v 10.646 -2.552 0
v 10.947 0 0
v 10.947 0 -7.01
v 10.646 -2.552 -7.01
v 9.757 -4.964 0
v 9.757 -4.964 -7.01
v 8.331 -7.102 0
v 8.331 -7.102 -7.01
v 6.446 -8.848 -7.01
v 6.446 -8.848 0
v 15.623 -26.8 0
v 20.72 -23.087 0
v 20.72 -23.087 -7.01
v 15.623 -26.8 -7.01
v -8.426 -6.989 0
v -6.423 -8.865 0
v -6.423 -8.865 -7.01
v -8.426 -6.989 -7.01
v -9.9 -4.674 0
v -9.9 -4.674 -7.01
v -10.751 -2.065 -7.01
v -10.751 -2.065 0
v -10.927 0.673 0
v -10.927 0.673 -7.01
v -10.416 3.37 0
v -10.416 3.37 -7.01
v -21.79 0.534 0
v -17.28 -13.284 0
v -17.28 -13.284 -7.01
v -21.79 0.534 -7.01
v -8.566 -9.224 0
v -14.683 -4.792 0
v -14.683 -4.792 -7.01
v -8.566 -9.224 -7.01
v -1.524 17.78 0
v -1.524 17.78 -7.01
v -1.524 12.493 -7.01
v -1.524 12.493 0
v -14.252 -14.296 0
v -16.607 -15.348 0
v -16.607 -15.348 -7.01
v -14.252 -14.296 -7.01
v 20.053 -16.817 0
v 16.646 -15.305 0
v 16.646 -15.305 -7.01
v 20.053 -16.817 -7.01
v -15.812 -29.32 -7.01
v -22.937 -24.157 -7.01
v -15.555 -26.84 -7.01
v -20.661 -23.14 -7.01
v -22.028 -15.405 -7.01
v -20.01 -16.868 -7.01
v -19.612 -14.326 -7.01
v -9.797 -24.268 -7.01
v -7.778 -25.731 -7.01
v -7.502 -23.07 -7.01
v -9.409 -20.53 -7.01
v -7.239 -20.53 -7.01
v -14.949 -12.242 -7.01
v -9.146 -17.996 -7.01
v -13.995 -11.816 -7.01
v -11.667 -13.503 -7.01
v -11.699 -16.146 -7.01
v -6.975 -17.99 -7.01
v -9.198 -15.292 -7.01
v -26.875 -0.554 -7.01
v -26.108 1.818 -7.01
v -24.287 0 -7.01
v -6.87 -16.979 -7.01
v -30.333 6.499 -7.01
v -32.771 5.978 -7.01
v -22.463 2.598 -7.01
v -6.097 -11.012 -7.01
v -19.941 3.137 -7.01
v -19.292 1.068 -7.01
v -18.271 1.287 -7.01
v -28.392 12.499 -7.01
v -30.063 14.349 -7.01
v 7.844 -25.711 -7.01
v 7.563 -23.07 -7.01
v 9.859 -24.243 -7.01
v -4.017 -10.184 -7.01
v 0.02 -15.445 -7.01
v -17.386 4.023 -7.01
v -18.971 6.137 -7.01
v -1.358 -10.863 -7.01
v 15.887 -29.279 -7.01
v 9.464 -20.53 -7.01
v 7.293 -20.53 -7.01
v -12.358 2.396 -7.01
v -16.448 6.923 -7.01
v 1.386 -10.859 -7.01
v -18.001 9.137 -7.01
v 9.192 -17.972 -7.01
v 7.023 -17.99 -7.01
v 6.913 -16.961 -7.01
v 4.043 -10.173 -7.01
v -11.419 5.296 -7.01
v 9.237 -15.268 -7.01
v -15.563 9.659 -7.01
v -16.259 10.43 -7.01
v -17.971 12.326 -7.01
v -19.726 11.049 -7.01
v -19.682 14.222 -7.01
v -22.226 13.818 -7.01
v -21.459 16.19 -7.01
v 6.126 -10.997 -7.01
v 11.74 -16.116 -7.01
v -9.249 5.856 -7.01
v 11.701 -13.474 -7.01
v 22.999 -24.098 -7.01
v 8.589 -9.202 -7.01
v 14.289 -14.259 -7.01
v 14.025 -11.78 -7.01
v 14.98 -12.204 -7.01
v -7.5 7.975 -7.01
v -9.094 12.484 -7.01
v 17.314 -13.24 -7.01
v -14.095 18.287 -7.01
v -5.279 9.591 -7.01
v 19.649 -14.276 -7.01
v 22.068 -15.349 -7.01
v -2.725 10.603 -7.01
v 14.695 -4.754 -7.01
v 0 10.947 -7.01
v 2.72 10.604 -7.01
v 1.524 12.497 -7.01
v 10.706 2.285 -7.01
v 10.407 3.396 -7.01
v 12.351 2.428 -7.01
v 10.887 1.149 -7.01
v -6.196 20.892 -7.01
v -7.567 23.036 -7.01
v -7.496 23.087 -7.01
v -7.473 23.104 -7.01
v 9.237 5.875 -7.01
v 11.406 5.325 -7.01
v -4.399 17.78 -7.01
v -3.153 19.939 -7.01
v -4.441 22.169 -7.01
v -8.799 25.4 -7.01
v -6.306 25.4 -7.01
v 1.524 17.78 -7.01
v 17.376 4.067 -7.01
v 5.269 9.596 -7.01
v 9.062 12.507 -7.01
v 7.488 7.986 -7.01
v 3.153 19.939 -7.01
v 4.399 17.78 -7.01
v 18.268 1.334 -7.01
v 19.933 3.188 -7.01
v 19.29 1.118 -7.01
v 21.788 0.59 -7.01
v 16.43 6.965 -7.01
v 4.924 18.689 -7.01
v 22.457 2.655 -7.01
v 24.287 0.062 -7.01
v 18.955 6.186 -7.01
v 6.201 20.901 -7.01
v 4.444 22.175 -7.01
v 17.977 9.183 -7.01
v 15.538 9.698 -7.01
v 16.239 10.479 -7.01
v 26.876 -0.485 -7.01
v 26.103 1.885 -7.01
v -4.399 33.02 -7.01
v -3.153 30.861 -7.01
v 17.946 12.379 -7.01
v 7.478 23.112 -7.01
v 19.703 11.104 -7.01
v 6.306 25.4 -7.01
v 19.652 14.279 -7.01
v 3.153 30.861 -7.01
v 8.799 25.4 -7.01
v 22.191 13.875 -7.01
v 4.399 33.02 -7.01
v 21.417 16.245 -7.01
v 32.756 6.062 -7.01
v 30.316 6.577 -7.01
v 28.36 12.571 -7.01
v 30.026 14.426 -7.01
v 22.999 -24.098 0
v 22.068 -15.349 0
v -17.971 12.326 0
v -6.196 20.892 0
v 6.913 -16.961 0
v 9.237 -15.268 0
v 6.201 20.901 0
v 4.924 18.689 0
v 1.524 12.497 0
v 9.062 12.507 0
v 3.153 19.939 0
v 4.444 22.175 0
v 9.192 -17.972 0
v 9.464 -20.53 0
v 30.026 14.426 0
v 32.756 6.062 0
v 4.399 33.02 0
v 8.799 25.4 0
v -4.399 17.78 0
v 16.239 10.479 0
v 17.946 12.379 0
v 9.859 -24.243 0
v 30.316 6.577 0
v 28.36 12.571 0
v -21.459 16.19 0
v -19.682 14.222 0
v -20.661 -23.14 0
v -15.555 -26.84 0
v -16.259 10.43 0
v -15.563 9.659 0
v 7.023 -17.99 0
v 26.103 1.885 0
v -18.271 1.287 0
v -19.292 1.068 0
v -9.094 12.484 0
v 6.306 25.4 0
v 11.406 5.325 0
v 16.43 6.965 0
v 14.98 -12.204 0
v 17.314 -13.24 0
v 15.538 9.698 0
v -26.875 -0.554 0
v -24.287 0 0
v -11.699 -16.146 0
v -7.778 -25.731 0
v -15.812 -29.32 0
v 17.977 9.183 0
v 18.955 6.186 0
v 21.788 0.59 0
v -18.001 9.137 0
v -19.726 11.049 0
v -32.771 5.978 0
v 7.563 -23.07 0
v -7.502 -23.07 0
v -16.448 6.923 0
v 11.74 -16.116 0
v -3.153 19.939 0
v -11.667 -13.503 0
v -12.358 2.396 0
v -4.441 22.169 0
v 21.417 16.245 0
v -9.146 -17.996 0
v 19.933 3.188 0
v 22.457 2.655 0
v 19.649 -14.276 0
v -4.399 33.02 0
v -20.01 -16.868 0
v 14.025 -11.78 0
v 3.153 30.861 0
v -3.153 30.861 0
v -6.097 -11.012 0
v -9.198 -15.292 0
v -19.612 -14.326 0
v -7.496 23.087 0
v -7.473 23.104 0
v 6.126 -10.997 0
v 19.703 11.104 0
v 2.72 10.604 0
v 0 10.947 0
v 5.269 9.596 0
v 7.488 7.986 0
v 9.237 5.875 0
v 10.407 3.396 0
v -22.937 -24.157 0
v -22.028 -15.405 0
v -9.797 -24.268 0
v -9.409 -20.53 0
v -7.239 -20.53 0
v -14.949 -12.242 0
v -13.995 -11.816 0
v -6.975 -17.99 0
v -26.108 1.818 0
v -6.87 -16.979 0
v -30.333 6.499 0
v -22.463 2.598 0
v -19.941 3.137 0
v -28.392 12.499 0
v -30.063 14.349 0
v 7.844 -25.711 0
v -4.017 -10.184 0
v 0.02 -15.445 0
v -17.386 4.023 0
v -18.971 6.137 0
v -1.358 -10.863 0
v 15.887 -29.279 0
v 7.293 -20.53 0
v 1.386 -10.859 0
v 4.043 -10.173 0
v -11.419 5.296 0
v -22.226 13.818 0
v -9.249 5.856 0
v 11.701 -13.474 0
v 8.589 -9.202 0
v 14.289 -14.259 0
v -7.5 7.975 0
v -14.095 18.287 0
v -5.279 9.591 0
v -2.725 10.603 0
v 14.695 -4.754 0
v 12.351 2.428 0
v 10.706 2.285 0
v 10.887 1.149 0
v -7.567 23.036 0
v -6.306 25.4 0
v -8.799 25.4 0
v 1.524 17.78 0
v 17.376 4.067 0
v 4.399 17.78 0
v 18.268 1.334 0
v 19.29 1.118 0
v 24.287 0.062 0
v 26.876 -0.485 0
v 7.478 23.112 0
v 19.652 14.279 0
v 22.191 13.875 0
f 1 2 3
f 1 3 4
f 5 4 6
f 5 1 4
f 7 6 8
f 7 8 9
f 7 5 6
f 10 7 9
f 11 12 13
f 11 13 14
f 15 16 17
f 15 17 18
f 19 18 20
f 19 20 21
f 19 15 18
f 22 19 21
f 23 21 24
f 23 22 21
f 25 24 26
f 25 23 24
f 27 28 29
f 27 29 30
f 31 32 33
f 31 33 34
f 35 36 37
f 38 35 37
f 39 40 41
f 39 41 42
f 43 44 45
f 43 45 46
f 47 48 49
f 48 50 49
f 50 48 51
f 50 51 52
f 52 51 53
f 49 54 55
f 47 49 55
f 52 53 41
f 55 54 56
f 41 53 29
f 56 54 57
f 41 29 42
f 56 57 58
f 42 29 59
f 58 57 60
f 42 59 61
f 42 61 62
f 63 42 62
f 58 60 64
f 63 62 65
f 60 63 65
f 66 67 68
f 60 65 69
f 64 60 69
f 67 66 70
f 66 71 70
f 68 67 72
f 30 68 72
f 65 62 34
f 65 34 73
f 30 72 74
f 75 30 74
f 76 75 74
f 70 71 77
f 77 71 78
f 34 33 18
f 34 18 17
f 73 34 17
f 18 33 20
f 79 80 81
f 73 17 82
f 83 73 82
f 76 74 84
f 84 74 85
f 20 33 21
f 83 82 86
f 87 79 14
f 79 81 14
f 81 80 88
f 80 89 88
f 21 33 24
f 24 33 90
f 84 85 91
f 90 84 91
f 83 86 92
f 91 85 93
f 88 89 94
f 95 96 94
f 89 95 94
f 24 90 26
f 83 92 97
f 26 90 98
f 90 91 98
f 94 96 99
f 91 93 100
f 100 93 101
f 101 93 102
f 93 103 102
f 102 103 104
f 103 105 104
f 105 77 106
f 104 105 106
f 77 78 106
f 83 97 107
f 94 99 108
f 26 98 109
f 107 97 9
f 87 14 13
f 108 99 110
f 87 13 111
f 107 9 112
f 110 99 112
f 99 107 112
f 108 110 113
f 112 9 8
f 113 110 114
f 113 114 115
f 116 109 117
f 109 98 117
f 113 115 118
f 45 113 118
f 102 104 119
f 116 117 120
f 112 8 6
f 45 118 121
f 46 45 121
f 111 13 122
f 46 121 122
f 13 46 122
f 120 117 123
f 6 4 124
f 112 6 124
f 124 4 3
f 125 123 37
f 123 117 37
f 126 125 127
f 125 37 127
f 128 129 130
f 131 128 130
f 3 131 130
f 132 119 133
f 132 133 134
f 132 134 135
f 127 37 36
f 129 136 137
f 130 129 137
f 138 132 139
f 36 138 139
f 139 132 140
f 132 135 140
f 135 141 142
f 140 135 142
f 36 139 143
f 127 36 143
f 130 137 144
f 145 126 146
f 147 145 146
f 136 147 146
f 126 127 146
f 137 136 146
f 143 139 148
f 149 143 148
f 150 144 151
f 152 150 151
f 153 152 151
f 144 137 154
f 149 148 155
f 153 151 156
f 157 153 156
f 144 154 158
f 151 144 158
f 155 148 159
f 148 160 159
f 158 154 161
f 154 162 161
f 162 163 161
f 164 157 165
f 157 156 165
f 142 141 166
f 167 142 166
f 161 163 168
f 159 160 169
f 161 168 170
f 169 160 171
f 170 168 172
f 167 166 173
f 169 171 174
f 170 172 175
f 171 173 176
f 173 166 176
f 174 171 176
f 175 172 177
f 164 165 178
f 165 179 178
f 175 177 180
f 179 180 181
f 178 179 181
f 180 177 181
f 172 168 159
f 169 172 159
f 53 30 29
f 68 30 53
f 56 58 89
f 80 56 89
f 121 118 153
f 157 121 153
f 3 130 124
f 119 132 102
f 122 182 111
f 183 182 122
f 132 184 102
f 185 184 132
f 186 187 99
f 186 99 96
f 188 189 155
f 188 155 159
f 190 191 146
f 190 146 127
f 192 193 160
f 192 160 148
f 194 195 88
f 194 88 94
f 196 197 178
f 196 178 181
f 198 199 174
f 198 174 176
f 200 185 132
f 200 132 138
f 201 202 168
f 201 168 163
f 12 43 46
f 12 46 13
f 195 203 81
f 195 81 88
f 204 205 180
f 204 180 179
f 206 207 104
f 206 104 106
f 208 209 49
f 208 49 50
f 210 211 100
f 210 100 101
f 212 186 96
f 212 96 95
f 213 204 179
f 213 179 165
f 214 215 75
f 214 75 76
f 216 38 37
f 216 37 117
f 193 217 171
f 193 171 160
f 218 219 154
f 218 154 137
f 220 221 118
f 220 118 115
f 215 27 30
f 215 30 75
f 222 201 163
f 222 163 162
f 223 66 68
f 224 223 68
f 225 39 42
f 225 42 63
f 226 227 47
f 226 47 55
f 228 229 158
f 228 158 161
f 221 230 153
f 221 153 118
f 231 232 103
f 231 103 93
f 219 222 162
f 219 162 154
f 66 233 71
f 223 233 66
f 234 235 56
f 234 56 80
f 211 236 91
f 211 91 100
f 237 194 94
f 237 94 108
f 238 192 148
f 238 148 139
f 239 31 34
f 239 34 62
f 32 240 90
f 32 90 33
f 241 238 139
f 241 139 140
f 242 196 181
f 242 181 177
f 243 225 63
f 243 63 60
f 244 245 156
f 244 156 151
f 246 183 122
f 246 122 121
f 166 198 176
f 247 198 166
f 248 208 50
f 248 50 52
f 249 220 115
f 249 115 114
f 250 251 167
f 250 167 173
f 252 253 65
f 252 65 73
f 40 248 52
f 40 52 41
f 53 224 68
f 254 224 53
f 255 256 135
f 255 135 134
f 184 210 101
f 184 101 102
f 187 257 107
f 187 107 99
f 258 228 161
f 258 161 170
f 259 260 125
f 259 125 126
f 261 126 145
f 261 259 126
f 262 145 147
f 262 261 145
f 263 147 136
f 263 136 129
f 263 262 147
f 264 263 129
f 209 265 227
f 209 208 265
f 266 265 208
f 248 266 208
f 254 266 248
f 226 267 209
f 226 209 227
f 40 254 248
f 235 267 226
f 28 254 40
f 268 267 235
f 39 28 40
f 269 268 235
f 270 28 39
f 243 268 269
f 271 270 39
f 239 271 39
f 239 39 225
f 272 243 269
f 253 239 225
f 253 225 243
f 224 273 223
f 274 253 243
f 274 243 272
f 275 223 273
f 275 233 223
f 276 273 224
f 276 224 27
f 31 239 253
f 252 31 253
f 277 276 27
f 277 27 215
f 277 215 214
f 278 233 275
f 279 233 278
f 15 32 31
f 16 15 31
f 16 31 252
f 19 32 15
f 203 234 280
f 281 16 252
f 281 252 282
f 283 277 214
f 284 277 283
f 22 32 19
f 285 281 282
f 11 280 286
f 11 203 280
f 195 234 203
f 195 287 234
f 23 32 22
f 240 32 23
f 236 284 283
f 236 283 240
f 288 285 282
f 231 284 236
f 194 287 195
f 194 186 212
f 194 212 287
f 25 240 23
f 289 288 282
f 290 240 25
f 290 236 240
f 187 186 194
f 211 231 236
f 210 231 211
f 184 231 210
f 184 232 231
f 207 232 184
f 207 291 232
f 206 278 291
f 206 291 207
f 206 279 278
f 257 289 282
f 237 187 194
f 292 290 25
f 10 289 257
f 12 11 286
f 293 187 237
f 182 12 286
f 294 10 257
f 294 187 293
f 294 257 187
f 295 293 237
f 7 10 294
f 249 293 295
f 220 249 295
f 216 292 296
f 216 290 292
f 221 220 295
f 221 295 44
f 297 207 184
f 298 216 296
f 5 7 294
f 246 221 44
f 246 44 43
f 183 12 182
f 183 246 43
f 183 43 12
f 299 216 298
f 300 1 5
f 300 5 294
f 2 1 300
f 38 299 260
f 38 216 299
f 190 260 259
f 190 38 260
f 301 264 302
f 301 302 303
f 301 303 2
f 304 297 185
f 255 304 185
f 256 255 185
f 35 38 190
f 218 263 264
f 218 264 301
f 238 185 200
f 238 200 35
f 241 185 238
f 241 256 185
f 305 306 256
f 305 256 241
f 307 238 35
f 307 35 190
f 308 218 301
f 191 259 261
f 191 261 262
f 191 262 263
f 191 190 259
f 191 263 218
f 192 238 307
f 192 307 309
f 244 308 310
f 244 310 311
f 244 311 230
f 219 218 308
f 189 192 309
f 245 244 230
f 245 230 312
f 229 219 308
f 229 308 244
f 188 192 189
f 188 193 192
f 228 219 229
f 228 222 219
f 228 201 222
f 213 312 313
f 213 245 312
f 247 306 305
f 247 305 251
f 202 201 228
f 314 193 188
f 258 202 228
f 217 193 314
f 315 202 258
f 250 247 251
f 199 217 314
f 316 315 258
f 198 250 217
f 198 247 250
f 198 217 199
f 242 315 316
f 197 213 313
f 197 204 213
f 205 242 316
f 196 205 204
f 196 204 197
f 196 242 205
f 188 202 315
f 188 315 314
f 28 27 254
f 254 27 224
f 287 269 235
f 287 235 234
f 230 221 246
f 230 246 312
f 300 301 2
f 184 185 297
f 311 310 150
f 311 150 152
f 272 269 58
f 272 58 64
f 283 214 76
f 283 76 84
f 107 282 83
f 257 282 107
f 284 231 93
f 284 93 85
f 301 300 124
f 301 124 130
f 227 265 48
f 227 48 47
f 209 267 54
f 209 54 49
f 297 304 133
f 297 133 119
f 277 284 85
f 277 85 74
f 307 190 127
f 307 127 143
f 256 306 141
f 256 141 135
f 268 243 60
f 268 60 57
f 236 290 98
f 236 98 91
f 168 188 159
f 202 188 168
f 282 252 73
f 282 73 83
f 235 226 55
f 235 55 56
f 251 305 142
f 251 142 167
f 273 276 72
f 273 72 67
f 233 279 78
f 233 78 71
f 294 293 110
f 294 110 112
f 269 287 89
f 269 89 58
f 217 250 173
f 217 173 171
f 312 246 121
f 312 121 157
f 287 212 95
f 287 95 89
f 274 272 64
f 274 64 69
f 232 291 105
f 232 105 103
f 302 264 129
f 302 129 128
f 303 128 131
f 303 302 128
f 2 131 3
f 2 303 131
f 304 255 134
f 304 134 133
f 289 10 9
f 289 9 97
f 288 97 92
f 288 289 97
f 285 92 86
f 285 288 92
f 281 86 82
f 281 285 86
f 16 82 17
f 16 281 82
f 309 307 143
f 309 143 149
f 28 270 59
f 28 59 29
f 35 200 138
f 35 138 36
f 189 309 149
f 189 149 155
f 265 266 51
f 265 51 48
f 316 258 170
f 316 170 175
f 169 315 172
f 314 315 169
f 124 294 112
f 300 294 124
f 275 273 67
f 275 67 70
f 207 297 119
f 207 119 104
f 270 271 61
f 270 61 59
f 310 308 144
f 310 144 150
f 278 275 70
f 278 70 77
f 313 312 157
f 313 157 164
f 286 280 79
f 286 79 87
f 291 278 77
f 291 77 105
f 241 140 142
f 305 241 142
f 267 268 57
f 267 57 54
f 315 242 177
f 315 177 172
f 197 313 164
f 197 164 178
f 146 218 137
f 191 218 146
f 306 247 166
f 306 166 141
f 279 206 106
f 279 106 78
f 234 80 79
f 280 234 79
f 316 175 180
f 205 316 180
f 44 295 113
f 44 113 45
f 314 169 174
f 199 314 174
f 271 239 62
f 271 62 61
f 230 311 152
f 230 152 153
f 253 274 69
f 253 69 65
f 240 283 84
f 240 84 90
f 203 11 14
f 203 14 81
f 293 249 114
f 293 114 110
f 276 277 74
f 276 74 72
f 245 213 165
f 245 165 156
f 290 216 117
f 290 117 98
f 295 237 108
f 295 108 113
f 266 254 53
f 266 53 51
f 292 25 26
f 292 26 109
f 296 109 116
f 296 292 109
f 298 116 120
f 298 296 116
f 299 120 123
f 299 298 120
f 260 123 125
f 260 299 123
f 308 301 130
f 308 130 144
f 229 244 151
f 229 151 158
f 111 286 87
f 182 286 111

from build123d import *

# Parameters (mm, degrees)
F1_DEPTH = 7.0104


with BuildPart() as f1:
    # F0 (on Top) → F1 (new body)
    with BuildSketch(Plane.XY):
        Polygon((-19.6123088264, -14.3259550522), (-17.2804522048, -13.2841705842), (-21.7898565446, 0.5341987249), (-24.2873556745, 0), align=None)
        Polygon((-17.9706494369, 12.3259955313), (-6.1962033311, 20.8921389834), (-7.4732849288, 23.1041091962), (-7.4963492105, 23.0873294731), (-7.5672560221, 23.035743359), (-14.0950221279, 18.286663837), (-19.682144033, 14.2219216577), align=None)
        Polygon((6.2011292189, 20.9006708714), (17.9456495392, 12.3792450933), (19.652060322, 14.2792867992), (7.4780391848, 23.112343809), align=None)
        Polygon((-7.4732849288, 23.1041091962), (-6.1962033311, 20.8921389834), (-4.4406123873, 22.1693662715), (-6.3058196401, 25.4), (-3.15290982, 30.861), (3.15290982, 30.861), (6.3058196401, 25.4), (4.4441426069, 22.1754807911), (6.2011292189, 20.9006708714), (7.4780391848, 23.112343809), (8.7988181024, 25.4), (4.3994090512, 33.02), (-4.3994090512, 33.02), (-8.7988181024, 25.4), align=None)
        Polygon((24.2872762442, 0.0621152063), (21.7884190625, 0.5899247999), (17.3143701173, -13.2399321733), (19.6488834891, -14.2757494827), align=None)
        Polygon((7.5632502618, -23.0699233381), (7.2930011362, -20.5299233381), (-7.2385424412, -20.5299233381), (-7.5022237136, -23.0699233381), align=None)
        Polygon((0, 17.78), (0, 12.4951580744), (1.524, 12.4971069019), (1.524, 17.78), align=None)
        Polygon((-21.7898565446, 0.5341987249), (-22.4633388079, 2.597980532), (-26.1077876566, 1.8184567658), (-30.3331935574, 6.4991945609), (-28.3922586688, 12.4988723099), (-22.2259178793, 13.8178122637), (-19.7262403807, 11.0487682433), (-17.9706494369, 12.3259955313), (-19.682144033, 14.2219216577), (-21.458571528, 16.1897778854), (-30.0627679784, 14.3493965545), (-32.7710492184, 5.9777531838), (-26.875134008, -0.5535088559), (-24.2873556745, 0), align=None)
        Polygon((26.1030515475, 1.8852218017), (22.4566209762, 2.6554222966), (21.7884190625, 0.5899247999), (24.2872762442, 0.0621152063), (26.8764617201, -0.484773565), (32.7556538665, 6.0615459892), (30.0259709045, 14.4262355188), (21.417095796, 16.2446054942), (19.652060322, 14.2792867992), (17.9456495392, 12.3792450933), (19.7026361512, 11.1044351735), (22.1905059686, 13.8746101275), (28.3601997963, 12.5714449785), (30.3164725858, 6.5767508156), align=None)
        Polygon((9.8592390124, -24.2429116945), (9.4641871004, -20.5299233381), (7.2930011362, -20.5299233381), (7.5632502618, -23.0699233381), (7.8442363623, -25.7108373238), (15.8869265185, -29.2793573324), (22.9987005779, -24.0984433466), (22.0677844811, -15.3490093523), (19.6488834891, -14.2757494827), (17.3143701173, -13.2399321733), (16.6461682035, -15.30542967), (20.0527818309, -16.8169349816), (20.719938367, -23.0873626775), (15.6231669577, -26.800351034), align=None)
        Polygon((-7.2385424412, -20.5299233381), (-9.4091448565, -20.5299233381), (-9.7972052281, -24.2680475327), (-15.5545736407, -26.8402198238), (-20.660824394, -23.140278665), (-20.0097067346, -16.8681652152), (-16.6069699415, -15.3479523913), (-17.2804522048, -13.2841705842), (-19.6123088264, -14.3259550522), (-22.0284570324, -15.4053977804), (-22.9369933013, -24.1571839894), (-15.8119922502, -29.319892583), (-7.7784549303, -25.7308149676), (-7.5022237136, -23.0699233381), align=None)
        Polygon((-18.9709794229, 6.1372355941), (-16.9167969376, 5.4726941603), (-16.4477088667, 6.9227053264), (-15.5626563176, 9.6585158456), (-16.2591548408, 10.4300694048), (-17.9706494369, 12.3259955313), (-19.7262403807, 11.0487682433), (-18.0005119785, 9.1370744685), align=None)
        Polygon((-17.3858850085, 4.0226829942), (-16.9167969376, 5.4726941603), (-18.9709794229, 6.1372355941), (-19.9414468672, 3.1373967196), (-22.4633388079, 2.597980532), (-21.7898565446, 0.5341987249), (-19.2923574146, 1.0683974498), (-18.2709375576, 1.286872475), align=None)
        Polygon((-11.6992129454, -16.1459635036), (-10.432419187, -14.3976744618), (-11.6665055694, -13.5034671029), (-13.9949197125, -11.816320165), (-14.9485955831, -12.2423861162), (-17.2804522048, -13.2841705842), (-16.6069699415, -15.3479523913), (-14.252338322, -14.2959929242), align=None)
        Polygon((-6.0974445658, -11.0123778434), (-7.3315309483, -10.1181704846), (-10.432419187, -14.3976744618), (-9.1983328045, -15.2918818207), align=None)
        Polygon((-10.432419187, -14.3976744618), (-7.3315309483, -10.1181704846), (-8.5656173307, -9.2239631257), (-11.6665055694, -13.5034671029), align=None)
        Polygon((-9.1983328045, -15.2918818207), (-10.432419187, -14.3976744618), (-11.6992129454, -16.1459635036), (-9.1460875687, -17.995934083), (-9.4091448565, -20.5299233381), (-7.2385424412, -20.5299233381), (-6.9748611689, -17.9899233381), (-6.8699186614, -16.9790287586), align=None)
        Polygon((11.740468181, -16.1159898204), (10.4692072952, -14.3709463366), (9.2374118949, -15.2683069619), (6.9133202655, -16.9614033295), (7.0227520107, -17.9899233381), (7.2930011362, -20.5299233381), (9.4641871004, -20.5299233381), (9.1920824764, -17.9724839986), align=None)
        Polygon((11.7010026955, -13.4735857113), (10.4692072952, -14.3709463366), (11.740468181, -16.1159898204), (14.2888538856, -14.2594956421), (16.6461682035, -15.30542967), (17.3143701173, -13.2399321733), (14.9798567454, -12.2041148639), (14.0250943249, -11.7804893438), align=None)
        Polygon((8.5891797148, -9.2020262892), (7.3573843145, -10.0993869145), (10.4692072952, -14.3709463366), (11.7010026955, -13.4735857113), align=None)
        Polygon((10.4692072952, -14.3709463366), (7.3573843145, -10.0993869145), (6.1255889142, -10.9967475398), (9.2374118949, -15.2683069619), align=None)
        with BuildLine():
            ThreePointArc((10.4072616447, 3.3962437808), (10.8115221613, 1.7194636708), (10.9474, 0))
            ThreePointArc((10.9474, 0), (9.7573805511, -4.9637779503), (6.4460404917, -8.8483969587))
            Line((6.4460404917, -8.8483969587), (7.3573843145, -10.0993869145))
            Line((7.3573843145, -10.0993869145), (8.5891797148, -9.2020262892))
            Line((8.5891797148, -9.2020262892), (14.6950184147, -4.7539343151))
            Line((14.6950184147, -4.7539343151), (12.3514394808, 2.4275993804))
            Line((12.3514394808, 2.4275993804), (11.8786445229, 3.8764061059))
            Line((11.8786445229, 3.8764061059), (10.4072616447, 3.3962437808))
        make_face()
        with BuildLine():
            Line((7.3573843145, -10.0993869145), (6.4460404917, -8.8483969587))
            ThreePointArc((6.4460404917, -8.8483969587), (0.0139990655, -10.9473910493), (-6.423389528, -8.8648538472))
            Line((-6.423389528, -8.8648538472), (-7.3315309483, -10.1181704846))
            Line((-7.3315309483, -10.1181704846), (-6.0974445658, -11.0123778434))
            Line((-6.0974445658, -11.0123778434), (0.0197502144, -15.4448395139))
            Line((0.0197502144, -15.4448395139), (6.1255889142, -10.9967475398))
            Line((6.1255889142, -10.9967475398), (7.3573843145, -10.0993869145))
        make_face()
        with BuildLine():
            Line((-7.3315309483, -10.1181704846), (-6.423389528, -8.8648538472))
            ThreePointArc((-6.423389528, -8.8648538472), (-10.4072616447, -3.3962437808), (-10.415913543, 3.3696159758))
            Line((-10.415913543, 3.3696159758), (-11.8885196301, 3.8460136511))
            Line((-11.8885196301, 3.8460136511), (-12.357607701, 2.396002485))
            Line((-12.357607701, 2.396002485), (-14.6828121109, -4.7915014552))
            Line((-14.6828121109, -4.7915014552), (-8.5656173307, -9.2239631257))
            Line((-8.5656173307, -9.2239631257), (-7.3315309483, -10.1181704846))
        make_face()
        with BuildLine():
            ThreePointArc((-10.415913543, 3.3696159758), (-6.4403816978, 8.8525166109), (0, 10.9474))
            Line((0, 10.9474), (0, 12.4951580744))
            Line((0, 12.4951580744), (-1.524, 12.493209247))
            Line((-1.524, 12.493209247), (-9.0942271493, 12.4835287574))
            Line((-9.0942271493, 12.4835287574), (-11.4194315592, 5.2960248172))
            Line((-11.4194315592, 5.2960248172), (-11.8885196301, 3.8460136511))
            Line((-11.8885196301, 3.8460136511), (-10.415913543, 3.3696159758))
        make_face()
        with BuildLine():
            ThreePointArc((0, 10.9474), (6.4290562136, 8.8607450569), (10.4072616447, 3.3962437808))
            Line((10.4072616447, 3.3962437808), (11.8786445229, 3.8764061059))
            Line((11.8786445229, 3.8764061059), (11.4058495651, 5.3252128313))
            Line((11.4058495651, 5.3252128313), (9.0622706312, 12.5067465268))
            Line((9.0622706312, 12.5067465268), (1.524, 12.4971069019))
            Line((1.524, 12.4971069019), (0, 12.4951580744))
            Line((0, 12.4951580744), (0, 10.9474))
        make_face()
        Polygon((-16.9167969376, 5.4726941603), (-11.8885196301, 3.8460136511), (-11.4194315592, 5.2960248172), (-16.4477088667, 6.9227053264), align=None)
        Polygon((-12.357607701, 2.396002485), (-11.8885196301, 3.8460136511), (-16.9167969376, 5.4726941603), (-17.3858850085, 4.0226829942), align=None)
        Polygon((11.4058495651, 5.3252128313), (11.8786445229, 3.8764061059), (16.9027451306, 5.5159411752), (16.4299501728, 6.9647479007), align=None)
        Polygon((16.9027451306, 5.5159411752), (11.8786445229, 3.8764061059), (12.3514394808, 2.4275993804), (17.3755400885, 4.0671344498), align=None)
        Polygon((16.4299501728, 6.9647479007), (16.9027451306, 5.5159411752), (18.9552213251, 6.1857340322), (17.9770849303, 9.1830811137), (19.7026361512, 11.1044351735), (17.9456495392, 12.3792450933), (16.2392387563, 10.4792033873), (15.5379036496, 9.6982859401), align=None)
        Polygon((18.9552213251, 6.1857340322), (16.9027451306, 5.5159411752), (17.3755400885, 4.0671344498), (18.2675866116, 1.3335964104), (19.2895618807, 1.1177343934), (21.7884190625, 0.5899247999), (22.4566209762, 2.6554222966), (19.9333577198, 3.1883869508), align=None)
        Polygon((-1.524, 12.493209247), (0, 12.4951580744), (0, 17.78), (-1.524, 17.78), align=None)
        Polygon((0, 19.939), (0, 17.78), (1.524, 17.78), (4.3994090512, 17.78), (4.924219253, 18.6889979337), (6.2011292189, 20.9006708714), (4.4441426069, 22.1754807911), (3.15290982, 19.939), align=None)
        Polygon((-1.524, 17.78), (0, 17.78), (0, 19.939), (-3.15290982, 19.939), (-4.4406123873, 22.1693662715), (-6.1962033311, 20.8921389834), (-4.3994090512, 17.78), align=None)
    extrude(amount=-F1_DEPTH)


solid = f1.part
